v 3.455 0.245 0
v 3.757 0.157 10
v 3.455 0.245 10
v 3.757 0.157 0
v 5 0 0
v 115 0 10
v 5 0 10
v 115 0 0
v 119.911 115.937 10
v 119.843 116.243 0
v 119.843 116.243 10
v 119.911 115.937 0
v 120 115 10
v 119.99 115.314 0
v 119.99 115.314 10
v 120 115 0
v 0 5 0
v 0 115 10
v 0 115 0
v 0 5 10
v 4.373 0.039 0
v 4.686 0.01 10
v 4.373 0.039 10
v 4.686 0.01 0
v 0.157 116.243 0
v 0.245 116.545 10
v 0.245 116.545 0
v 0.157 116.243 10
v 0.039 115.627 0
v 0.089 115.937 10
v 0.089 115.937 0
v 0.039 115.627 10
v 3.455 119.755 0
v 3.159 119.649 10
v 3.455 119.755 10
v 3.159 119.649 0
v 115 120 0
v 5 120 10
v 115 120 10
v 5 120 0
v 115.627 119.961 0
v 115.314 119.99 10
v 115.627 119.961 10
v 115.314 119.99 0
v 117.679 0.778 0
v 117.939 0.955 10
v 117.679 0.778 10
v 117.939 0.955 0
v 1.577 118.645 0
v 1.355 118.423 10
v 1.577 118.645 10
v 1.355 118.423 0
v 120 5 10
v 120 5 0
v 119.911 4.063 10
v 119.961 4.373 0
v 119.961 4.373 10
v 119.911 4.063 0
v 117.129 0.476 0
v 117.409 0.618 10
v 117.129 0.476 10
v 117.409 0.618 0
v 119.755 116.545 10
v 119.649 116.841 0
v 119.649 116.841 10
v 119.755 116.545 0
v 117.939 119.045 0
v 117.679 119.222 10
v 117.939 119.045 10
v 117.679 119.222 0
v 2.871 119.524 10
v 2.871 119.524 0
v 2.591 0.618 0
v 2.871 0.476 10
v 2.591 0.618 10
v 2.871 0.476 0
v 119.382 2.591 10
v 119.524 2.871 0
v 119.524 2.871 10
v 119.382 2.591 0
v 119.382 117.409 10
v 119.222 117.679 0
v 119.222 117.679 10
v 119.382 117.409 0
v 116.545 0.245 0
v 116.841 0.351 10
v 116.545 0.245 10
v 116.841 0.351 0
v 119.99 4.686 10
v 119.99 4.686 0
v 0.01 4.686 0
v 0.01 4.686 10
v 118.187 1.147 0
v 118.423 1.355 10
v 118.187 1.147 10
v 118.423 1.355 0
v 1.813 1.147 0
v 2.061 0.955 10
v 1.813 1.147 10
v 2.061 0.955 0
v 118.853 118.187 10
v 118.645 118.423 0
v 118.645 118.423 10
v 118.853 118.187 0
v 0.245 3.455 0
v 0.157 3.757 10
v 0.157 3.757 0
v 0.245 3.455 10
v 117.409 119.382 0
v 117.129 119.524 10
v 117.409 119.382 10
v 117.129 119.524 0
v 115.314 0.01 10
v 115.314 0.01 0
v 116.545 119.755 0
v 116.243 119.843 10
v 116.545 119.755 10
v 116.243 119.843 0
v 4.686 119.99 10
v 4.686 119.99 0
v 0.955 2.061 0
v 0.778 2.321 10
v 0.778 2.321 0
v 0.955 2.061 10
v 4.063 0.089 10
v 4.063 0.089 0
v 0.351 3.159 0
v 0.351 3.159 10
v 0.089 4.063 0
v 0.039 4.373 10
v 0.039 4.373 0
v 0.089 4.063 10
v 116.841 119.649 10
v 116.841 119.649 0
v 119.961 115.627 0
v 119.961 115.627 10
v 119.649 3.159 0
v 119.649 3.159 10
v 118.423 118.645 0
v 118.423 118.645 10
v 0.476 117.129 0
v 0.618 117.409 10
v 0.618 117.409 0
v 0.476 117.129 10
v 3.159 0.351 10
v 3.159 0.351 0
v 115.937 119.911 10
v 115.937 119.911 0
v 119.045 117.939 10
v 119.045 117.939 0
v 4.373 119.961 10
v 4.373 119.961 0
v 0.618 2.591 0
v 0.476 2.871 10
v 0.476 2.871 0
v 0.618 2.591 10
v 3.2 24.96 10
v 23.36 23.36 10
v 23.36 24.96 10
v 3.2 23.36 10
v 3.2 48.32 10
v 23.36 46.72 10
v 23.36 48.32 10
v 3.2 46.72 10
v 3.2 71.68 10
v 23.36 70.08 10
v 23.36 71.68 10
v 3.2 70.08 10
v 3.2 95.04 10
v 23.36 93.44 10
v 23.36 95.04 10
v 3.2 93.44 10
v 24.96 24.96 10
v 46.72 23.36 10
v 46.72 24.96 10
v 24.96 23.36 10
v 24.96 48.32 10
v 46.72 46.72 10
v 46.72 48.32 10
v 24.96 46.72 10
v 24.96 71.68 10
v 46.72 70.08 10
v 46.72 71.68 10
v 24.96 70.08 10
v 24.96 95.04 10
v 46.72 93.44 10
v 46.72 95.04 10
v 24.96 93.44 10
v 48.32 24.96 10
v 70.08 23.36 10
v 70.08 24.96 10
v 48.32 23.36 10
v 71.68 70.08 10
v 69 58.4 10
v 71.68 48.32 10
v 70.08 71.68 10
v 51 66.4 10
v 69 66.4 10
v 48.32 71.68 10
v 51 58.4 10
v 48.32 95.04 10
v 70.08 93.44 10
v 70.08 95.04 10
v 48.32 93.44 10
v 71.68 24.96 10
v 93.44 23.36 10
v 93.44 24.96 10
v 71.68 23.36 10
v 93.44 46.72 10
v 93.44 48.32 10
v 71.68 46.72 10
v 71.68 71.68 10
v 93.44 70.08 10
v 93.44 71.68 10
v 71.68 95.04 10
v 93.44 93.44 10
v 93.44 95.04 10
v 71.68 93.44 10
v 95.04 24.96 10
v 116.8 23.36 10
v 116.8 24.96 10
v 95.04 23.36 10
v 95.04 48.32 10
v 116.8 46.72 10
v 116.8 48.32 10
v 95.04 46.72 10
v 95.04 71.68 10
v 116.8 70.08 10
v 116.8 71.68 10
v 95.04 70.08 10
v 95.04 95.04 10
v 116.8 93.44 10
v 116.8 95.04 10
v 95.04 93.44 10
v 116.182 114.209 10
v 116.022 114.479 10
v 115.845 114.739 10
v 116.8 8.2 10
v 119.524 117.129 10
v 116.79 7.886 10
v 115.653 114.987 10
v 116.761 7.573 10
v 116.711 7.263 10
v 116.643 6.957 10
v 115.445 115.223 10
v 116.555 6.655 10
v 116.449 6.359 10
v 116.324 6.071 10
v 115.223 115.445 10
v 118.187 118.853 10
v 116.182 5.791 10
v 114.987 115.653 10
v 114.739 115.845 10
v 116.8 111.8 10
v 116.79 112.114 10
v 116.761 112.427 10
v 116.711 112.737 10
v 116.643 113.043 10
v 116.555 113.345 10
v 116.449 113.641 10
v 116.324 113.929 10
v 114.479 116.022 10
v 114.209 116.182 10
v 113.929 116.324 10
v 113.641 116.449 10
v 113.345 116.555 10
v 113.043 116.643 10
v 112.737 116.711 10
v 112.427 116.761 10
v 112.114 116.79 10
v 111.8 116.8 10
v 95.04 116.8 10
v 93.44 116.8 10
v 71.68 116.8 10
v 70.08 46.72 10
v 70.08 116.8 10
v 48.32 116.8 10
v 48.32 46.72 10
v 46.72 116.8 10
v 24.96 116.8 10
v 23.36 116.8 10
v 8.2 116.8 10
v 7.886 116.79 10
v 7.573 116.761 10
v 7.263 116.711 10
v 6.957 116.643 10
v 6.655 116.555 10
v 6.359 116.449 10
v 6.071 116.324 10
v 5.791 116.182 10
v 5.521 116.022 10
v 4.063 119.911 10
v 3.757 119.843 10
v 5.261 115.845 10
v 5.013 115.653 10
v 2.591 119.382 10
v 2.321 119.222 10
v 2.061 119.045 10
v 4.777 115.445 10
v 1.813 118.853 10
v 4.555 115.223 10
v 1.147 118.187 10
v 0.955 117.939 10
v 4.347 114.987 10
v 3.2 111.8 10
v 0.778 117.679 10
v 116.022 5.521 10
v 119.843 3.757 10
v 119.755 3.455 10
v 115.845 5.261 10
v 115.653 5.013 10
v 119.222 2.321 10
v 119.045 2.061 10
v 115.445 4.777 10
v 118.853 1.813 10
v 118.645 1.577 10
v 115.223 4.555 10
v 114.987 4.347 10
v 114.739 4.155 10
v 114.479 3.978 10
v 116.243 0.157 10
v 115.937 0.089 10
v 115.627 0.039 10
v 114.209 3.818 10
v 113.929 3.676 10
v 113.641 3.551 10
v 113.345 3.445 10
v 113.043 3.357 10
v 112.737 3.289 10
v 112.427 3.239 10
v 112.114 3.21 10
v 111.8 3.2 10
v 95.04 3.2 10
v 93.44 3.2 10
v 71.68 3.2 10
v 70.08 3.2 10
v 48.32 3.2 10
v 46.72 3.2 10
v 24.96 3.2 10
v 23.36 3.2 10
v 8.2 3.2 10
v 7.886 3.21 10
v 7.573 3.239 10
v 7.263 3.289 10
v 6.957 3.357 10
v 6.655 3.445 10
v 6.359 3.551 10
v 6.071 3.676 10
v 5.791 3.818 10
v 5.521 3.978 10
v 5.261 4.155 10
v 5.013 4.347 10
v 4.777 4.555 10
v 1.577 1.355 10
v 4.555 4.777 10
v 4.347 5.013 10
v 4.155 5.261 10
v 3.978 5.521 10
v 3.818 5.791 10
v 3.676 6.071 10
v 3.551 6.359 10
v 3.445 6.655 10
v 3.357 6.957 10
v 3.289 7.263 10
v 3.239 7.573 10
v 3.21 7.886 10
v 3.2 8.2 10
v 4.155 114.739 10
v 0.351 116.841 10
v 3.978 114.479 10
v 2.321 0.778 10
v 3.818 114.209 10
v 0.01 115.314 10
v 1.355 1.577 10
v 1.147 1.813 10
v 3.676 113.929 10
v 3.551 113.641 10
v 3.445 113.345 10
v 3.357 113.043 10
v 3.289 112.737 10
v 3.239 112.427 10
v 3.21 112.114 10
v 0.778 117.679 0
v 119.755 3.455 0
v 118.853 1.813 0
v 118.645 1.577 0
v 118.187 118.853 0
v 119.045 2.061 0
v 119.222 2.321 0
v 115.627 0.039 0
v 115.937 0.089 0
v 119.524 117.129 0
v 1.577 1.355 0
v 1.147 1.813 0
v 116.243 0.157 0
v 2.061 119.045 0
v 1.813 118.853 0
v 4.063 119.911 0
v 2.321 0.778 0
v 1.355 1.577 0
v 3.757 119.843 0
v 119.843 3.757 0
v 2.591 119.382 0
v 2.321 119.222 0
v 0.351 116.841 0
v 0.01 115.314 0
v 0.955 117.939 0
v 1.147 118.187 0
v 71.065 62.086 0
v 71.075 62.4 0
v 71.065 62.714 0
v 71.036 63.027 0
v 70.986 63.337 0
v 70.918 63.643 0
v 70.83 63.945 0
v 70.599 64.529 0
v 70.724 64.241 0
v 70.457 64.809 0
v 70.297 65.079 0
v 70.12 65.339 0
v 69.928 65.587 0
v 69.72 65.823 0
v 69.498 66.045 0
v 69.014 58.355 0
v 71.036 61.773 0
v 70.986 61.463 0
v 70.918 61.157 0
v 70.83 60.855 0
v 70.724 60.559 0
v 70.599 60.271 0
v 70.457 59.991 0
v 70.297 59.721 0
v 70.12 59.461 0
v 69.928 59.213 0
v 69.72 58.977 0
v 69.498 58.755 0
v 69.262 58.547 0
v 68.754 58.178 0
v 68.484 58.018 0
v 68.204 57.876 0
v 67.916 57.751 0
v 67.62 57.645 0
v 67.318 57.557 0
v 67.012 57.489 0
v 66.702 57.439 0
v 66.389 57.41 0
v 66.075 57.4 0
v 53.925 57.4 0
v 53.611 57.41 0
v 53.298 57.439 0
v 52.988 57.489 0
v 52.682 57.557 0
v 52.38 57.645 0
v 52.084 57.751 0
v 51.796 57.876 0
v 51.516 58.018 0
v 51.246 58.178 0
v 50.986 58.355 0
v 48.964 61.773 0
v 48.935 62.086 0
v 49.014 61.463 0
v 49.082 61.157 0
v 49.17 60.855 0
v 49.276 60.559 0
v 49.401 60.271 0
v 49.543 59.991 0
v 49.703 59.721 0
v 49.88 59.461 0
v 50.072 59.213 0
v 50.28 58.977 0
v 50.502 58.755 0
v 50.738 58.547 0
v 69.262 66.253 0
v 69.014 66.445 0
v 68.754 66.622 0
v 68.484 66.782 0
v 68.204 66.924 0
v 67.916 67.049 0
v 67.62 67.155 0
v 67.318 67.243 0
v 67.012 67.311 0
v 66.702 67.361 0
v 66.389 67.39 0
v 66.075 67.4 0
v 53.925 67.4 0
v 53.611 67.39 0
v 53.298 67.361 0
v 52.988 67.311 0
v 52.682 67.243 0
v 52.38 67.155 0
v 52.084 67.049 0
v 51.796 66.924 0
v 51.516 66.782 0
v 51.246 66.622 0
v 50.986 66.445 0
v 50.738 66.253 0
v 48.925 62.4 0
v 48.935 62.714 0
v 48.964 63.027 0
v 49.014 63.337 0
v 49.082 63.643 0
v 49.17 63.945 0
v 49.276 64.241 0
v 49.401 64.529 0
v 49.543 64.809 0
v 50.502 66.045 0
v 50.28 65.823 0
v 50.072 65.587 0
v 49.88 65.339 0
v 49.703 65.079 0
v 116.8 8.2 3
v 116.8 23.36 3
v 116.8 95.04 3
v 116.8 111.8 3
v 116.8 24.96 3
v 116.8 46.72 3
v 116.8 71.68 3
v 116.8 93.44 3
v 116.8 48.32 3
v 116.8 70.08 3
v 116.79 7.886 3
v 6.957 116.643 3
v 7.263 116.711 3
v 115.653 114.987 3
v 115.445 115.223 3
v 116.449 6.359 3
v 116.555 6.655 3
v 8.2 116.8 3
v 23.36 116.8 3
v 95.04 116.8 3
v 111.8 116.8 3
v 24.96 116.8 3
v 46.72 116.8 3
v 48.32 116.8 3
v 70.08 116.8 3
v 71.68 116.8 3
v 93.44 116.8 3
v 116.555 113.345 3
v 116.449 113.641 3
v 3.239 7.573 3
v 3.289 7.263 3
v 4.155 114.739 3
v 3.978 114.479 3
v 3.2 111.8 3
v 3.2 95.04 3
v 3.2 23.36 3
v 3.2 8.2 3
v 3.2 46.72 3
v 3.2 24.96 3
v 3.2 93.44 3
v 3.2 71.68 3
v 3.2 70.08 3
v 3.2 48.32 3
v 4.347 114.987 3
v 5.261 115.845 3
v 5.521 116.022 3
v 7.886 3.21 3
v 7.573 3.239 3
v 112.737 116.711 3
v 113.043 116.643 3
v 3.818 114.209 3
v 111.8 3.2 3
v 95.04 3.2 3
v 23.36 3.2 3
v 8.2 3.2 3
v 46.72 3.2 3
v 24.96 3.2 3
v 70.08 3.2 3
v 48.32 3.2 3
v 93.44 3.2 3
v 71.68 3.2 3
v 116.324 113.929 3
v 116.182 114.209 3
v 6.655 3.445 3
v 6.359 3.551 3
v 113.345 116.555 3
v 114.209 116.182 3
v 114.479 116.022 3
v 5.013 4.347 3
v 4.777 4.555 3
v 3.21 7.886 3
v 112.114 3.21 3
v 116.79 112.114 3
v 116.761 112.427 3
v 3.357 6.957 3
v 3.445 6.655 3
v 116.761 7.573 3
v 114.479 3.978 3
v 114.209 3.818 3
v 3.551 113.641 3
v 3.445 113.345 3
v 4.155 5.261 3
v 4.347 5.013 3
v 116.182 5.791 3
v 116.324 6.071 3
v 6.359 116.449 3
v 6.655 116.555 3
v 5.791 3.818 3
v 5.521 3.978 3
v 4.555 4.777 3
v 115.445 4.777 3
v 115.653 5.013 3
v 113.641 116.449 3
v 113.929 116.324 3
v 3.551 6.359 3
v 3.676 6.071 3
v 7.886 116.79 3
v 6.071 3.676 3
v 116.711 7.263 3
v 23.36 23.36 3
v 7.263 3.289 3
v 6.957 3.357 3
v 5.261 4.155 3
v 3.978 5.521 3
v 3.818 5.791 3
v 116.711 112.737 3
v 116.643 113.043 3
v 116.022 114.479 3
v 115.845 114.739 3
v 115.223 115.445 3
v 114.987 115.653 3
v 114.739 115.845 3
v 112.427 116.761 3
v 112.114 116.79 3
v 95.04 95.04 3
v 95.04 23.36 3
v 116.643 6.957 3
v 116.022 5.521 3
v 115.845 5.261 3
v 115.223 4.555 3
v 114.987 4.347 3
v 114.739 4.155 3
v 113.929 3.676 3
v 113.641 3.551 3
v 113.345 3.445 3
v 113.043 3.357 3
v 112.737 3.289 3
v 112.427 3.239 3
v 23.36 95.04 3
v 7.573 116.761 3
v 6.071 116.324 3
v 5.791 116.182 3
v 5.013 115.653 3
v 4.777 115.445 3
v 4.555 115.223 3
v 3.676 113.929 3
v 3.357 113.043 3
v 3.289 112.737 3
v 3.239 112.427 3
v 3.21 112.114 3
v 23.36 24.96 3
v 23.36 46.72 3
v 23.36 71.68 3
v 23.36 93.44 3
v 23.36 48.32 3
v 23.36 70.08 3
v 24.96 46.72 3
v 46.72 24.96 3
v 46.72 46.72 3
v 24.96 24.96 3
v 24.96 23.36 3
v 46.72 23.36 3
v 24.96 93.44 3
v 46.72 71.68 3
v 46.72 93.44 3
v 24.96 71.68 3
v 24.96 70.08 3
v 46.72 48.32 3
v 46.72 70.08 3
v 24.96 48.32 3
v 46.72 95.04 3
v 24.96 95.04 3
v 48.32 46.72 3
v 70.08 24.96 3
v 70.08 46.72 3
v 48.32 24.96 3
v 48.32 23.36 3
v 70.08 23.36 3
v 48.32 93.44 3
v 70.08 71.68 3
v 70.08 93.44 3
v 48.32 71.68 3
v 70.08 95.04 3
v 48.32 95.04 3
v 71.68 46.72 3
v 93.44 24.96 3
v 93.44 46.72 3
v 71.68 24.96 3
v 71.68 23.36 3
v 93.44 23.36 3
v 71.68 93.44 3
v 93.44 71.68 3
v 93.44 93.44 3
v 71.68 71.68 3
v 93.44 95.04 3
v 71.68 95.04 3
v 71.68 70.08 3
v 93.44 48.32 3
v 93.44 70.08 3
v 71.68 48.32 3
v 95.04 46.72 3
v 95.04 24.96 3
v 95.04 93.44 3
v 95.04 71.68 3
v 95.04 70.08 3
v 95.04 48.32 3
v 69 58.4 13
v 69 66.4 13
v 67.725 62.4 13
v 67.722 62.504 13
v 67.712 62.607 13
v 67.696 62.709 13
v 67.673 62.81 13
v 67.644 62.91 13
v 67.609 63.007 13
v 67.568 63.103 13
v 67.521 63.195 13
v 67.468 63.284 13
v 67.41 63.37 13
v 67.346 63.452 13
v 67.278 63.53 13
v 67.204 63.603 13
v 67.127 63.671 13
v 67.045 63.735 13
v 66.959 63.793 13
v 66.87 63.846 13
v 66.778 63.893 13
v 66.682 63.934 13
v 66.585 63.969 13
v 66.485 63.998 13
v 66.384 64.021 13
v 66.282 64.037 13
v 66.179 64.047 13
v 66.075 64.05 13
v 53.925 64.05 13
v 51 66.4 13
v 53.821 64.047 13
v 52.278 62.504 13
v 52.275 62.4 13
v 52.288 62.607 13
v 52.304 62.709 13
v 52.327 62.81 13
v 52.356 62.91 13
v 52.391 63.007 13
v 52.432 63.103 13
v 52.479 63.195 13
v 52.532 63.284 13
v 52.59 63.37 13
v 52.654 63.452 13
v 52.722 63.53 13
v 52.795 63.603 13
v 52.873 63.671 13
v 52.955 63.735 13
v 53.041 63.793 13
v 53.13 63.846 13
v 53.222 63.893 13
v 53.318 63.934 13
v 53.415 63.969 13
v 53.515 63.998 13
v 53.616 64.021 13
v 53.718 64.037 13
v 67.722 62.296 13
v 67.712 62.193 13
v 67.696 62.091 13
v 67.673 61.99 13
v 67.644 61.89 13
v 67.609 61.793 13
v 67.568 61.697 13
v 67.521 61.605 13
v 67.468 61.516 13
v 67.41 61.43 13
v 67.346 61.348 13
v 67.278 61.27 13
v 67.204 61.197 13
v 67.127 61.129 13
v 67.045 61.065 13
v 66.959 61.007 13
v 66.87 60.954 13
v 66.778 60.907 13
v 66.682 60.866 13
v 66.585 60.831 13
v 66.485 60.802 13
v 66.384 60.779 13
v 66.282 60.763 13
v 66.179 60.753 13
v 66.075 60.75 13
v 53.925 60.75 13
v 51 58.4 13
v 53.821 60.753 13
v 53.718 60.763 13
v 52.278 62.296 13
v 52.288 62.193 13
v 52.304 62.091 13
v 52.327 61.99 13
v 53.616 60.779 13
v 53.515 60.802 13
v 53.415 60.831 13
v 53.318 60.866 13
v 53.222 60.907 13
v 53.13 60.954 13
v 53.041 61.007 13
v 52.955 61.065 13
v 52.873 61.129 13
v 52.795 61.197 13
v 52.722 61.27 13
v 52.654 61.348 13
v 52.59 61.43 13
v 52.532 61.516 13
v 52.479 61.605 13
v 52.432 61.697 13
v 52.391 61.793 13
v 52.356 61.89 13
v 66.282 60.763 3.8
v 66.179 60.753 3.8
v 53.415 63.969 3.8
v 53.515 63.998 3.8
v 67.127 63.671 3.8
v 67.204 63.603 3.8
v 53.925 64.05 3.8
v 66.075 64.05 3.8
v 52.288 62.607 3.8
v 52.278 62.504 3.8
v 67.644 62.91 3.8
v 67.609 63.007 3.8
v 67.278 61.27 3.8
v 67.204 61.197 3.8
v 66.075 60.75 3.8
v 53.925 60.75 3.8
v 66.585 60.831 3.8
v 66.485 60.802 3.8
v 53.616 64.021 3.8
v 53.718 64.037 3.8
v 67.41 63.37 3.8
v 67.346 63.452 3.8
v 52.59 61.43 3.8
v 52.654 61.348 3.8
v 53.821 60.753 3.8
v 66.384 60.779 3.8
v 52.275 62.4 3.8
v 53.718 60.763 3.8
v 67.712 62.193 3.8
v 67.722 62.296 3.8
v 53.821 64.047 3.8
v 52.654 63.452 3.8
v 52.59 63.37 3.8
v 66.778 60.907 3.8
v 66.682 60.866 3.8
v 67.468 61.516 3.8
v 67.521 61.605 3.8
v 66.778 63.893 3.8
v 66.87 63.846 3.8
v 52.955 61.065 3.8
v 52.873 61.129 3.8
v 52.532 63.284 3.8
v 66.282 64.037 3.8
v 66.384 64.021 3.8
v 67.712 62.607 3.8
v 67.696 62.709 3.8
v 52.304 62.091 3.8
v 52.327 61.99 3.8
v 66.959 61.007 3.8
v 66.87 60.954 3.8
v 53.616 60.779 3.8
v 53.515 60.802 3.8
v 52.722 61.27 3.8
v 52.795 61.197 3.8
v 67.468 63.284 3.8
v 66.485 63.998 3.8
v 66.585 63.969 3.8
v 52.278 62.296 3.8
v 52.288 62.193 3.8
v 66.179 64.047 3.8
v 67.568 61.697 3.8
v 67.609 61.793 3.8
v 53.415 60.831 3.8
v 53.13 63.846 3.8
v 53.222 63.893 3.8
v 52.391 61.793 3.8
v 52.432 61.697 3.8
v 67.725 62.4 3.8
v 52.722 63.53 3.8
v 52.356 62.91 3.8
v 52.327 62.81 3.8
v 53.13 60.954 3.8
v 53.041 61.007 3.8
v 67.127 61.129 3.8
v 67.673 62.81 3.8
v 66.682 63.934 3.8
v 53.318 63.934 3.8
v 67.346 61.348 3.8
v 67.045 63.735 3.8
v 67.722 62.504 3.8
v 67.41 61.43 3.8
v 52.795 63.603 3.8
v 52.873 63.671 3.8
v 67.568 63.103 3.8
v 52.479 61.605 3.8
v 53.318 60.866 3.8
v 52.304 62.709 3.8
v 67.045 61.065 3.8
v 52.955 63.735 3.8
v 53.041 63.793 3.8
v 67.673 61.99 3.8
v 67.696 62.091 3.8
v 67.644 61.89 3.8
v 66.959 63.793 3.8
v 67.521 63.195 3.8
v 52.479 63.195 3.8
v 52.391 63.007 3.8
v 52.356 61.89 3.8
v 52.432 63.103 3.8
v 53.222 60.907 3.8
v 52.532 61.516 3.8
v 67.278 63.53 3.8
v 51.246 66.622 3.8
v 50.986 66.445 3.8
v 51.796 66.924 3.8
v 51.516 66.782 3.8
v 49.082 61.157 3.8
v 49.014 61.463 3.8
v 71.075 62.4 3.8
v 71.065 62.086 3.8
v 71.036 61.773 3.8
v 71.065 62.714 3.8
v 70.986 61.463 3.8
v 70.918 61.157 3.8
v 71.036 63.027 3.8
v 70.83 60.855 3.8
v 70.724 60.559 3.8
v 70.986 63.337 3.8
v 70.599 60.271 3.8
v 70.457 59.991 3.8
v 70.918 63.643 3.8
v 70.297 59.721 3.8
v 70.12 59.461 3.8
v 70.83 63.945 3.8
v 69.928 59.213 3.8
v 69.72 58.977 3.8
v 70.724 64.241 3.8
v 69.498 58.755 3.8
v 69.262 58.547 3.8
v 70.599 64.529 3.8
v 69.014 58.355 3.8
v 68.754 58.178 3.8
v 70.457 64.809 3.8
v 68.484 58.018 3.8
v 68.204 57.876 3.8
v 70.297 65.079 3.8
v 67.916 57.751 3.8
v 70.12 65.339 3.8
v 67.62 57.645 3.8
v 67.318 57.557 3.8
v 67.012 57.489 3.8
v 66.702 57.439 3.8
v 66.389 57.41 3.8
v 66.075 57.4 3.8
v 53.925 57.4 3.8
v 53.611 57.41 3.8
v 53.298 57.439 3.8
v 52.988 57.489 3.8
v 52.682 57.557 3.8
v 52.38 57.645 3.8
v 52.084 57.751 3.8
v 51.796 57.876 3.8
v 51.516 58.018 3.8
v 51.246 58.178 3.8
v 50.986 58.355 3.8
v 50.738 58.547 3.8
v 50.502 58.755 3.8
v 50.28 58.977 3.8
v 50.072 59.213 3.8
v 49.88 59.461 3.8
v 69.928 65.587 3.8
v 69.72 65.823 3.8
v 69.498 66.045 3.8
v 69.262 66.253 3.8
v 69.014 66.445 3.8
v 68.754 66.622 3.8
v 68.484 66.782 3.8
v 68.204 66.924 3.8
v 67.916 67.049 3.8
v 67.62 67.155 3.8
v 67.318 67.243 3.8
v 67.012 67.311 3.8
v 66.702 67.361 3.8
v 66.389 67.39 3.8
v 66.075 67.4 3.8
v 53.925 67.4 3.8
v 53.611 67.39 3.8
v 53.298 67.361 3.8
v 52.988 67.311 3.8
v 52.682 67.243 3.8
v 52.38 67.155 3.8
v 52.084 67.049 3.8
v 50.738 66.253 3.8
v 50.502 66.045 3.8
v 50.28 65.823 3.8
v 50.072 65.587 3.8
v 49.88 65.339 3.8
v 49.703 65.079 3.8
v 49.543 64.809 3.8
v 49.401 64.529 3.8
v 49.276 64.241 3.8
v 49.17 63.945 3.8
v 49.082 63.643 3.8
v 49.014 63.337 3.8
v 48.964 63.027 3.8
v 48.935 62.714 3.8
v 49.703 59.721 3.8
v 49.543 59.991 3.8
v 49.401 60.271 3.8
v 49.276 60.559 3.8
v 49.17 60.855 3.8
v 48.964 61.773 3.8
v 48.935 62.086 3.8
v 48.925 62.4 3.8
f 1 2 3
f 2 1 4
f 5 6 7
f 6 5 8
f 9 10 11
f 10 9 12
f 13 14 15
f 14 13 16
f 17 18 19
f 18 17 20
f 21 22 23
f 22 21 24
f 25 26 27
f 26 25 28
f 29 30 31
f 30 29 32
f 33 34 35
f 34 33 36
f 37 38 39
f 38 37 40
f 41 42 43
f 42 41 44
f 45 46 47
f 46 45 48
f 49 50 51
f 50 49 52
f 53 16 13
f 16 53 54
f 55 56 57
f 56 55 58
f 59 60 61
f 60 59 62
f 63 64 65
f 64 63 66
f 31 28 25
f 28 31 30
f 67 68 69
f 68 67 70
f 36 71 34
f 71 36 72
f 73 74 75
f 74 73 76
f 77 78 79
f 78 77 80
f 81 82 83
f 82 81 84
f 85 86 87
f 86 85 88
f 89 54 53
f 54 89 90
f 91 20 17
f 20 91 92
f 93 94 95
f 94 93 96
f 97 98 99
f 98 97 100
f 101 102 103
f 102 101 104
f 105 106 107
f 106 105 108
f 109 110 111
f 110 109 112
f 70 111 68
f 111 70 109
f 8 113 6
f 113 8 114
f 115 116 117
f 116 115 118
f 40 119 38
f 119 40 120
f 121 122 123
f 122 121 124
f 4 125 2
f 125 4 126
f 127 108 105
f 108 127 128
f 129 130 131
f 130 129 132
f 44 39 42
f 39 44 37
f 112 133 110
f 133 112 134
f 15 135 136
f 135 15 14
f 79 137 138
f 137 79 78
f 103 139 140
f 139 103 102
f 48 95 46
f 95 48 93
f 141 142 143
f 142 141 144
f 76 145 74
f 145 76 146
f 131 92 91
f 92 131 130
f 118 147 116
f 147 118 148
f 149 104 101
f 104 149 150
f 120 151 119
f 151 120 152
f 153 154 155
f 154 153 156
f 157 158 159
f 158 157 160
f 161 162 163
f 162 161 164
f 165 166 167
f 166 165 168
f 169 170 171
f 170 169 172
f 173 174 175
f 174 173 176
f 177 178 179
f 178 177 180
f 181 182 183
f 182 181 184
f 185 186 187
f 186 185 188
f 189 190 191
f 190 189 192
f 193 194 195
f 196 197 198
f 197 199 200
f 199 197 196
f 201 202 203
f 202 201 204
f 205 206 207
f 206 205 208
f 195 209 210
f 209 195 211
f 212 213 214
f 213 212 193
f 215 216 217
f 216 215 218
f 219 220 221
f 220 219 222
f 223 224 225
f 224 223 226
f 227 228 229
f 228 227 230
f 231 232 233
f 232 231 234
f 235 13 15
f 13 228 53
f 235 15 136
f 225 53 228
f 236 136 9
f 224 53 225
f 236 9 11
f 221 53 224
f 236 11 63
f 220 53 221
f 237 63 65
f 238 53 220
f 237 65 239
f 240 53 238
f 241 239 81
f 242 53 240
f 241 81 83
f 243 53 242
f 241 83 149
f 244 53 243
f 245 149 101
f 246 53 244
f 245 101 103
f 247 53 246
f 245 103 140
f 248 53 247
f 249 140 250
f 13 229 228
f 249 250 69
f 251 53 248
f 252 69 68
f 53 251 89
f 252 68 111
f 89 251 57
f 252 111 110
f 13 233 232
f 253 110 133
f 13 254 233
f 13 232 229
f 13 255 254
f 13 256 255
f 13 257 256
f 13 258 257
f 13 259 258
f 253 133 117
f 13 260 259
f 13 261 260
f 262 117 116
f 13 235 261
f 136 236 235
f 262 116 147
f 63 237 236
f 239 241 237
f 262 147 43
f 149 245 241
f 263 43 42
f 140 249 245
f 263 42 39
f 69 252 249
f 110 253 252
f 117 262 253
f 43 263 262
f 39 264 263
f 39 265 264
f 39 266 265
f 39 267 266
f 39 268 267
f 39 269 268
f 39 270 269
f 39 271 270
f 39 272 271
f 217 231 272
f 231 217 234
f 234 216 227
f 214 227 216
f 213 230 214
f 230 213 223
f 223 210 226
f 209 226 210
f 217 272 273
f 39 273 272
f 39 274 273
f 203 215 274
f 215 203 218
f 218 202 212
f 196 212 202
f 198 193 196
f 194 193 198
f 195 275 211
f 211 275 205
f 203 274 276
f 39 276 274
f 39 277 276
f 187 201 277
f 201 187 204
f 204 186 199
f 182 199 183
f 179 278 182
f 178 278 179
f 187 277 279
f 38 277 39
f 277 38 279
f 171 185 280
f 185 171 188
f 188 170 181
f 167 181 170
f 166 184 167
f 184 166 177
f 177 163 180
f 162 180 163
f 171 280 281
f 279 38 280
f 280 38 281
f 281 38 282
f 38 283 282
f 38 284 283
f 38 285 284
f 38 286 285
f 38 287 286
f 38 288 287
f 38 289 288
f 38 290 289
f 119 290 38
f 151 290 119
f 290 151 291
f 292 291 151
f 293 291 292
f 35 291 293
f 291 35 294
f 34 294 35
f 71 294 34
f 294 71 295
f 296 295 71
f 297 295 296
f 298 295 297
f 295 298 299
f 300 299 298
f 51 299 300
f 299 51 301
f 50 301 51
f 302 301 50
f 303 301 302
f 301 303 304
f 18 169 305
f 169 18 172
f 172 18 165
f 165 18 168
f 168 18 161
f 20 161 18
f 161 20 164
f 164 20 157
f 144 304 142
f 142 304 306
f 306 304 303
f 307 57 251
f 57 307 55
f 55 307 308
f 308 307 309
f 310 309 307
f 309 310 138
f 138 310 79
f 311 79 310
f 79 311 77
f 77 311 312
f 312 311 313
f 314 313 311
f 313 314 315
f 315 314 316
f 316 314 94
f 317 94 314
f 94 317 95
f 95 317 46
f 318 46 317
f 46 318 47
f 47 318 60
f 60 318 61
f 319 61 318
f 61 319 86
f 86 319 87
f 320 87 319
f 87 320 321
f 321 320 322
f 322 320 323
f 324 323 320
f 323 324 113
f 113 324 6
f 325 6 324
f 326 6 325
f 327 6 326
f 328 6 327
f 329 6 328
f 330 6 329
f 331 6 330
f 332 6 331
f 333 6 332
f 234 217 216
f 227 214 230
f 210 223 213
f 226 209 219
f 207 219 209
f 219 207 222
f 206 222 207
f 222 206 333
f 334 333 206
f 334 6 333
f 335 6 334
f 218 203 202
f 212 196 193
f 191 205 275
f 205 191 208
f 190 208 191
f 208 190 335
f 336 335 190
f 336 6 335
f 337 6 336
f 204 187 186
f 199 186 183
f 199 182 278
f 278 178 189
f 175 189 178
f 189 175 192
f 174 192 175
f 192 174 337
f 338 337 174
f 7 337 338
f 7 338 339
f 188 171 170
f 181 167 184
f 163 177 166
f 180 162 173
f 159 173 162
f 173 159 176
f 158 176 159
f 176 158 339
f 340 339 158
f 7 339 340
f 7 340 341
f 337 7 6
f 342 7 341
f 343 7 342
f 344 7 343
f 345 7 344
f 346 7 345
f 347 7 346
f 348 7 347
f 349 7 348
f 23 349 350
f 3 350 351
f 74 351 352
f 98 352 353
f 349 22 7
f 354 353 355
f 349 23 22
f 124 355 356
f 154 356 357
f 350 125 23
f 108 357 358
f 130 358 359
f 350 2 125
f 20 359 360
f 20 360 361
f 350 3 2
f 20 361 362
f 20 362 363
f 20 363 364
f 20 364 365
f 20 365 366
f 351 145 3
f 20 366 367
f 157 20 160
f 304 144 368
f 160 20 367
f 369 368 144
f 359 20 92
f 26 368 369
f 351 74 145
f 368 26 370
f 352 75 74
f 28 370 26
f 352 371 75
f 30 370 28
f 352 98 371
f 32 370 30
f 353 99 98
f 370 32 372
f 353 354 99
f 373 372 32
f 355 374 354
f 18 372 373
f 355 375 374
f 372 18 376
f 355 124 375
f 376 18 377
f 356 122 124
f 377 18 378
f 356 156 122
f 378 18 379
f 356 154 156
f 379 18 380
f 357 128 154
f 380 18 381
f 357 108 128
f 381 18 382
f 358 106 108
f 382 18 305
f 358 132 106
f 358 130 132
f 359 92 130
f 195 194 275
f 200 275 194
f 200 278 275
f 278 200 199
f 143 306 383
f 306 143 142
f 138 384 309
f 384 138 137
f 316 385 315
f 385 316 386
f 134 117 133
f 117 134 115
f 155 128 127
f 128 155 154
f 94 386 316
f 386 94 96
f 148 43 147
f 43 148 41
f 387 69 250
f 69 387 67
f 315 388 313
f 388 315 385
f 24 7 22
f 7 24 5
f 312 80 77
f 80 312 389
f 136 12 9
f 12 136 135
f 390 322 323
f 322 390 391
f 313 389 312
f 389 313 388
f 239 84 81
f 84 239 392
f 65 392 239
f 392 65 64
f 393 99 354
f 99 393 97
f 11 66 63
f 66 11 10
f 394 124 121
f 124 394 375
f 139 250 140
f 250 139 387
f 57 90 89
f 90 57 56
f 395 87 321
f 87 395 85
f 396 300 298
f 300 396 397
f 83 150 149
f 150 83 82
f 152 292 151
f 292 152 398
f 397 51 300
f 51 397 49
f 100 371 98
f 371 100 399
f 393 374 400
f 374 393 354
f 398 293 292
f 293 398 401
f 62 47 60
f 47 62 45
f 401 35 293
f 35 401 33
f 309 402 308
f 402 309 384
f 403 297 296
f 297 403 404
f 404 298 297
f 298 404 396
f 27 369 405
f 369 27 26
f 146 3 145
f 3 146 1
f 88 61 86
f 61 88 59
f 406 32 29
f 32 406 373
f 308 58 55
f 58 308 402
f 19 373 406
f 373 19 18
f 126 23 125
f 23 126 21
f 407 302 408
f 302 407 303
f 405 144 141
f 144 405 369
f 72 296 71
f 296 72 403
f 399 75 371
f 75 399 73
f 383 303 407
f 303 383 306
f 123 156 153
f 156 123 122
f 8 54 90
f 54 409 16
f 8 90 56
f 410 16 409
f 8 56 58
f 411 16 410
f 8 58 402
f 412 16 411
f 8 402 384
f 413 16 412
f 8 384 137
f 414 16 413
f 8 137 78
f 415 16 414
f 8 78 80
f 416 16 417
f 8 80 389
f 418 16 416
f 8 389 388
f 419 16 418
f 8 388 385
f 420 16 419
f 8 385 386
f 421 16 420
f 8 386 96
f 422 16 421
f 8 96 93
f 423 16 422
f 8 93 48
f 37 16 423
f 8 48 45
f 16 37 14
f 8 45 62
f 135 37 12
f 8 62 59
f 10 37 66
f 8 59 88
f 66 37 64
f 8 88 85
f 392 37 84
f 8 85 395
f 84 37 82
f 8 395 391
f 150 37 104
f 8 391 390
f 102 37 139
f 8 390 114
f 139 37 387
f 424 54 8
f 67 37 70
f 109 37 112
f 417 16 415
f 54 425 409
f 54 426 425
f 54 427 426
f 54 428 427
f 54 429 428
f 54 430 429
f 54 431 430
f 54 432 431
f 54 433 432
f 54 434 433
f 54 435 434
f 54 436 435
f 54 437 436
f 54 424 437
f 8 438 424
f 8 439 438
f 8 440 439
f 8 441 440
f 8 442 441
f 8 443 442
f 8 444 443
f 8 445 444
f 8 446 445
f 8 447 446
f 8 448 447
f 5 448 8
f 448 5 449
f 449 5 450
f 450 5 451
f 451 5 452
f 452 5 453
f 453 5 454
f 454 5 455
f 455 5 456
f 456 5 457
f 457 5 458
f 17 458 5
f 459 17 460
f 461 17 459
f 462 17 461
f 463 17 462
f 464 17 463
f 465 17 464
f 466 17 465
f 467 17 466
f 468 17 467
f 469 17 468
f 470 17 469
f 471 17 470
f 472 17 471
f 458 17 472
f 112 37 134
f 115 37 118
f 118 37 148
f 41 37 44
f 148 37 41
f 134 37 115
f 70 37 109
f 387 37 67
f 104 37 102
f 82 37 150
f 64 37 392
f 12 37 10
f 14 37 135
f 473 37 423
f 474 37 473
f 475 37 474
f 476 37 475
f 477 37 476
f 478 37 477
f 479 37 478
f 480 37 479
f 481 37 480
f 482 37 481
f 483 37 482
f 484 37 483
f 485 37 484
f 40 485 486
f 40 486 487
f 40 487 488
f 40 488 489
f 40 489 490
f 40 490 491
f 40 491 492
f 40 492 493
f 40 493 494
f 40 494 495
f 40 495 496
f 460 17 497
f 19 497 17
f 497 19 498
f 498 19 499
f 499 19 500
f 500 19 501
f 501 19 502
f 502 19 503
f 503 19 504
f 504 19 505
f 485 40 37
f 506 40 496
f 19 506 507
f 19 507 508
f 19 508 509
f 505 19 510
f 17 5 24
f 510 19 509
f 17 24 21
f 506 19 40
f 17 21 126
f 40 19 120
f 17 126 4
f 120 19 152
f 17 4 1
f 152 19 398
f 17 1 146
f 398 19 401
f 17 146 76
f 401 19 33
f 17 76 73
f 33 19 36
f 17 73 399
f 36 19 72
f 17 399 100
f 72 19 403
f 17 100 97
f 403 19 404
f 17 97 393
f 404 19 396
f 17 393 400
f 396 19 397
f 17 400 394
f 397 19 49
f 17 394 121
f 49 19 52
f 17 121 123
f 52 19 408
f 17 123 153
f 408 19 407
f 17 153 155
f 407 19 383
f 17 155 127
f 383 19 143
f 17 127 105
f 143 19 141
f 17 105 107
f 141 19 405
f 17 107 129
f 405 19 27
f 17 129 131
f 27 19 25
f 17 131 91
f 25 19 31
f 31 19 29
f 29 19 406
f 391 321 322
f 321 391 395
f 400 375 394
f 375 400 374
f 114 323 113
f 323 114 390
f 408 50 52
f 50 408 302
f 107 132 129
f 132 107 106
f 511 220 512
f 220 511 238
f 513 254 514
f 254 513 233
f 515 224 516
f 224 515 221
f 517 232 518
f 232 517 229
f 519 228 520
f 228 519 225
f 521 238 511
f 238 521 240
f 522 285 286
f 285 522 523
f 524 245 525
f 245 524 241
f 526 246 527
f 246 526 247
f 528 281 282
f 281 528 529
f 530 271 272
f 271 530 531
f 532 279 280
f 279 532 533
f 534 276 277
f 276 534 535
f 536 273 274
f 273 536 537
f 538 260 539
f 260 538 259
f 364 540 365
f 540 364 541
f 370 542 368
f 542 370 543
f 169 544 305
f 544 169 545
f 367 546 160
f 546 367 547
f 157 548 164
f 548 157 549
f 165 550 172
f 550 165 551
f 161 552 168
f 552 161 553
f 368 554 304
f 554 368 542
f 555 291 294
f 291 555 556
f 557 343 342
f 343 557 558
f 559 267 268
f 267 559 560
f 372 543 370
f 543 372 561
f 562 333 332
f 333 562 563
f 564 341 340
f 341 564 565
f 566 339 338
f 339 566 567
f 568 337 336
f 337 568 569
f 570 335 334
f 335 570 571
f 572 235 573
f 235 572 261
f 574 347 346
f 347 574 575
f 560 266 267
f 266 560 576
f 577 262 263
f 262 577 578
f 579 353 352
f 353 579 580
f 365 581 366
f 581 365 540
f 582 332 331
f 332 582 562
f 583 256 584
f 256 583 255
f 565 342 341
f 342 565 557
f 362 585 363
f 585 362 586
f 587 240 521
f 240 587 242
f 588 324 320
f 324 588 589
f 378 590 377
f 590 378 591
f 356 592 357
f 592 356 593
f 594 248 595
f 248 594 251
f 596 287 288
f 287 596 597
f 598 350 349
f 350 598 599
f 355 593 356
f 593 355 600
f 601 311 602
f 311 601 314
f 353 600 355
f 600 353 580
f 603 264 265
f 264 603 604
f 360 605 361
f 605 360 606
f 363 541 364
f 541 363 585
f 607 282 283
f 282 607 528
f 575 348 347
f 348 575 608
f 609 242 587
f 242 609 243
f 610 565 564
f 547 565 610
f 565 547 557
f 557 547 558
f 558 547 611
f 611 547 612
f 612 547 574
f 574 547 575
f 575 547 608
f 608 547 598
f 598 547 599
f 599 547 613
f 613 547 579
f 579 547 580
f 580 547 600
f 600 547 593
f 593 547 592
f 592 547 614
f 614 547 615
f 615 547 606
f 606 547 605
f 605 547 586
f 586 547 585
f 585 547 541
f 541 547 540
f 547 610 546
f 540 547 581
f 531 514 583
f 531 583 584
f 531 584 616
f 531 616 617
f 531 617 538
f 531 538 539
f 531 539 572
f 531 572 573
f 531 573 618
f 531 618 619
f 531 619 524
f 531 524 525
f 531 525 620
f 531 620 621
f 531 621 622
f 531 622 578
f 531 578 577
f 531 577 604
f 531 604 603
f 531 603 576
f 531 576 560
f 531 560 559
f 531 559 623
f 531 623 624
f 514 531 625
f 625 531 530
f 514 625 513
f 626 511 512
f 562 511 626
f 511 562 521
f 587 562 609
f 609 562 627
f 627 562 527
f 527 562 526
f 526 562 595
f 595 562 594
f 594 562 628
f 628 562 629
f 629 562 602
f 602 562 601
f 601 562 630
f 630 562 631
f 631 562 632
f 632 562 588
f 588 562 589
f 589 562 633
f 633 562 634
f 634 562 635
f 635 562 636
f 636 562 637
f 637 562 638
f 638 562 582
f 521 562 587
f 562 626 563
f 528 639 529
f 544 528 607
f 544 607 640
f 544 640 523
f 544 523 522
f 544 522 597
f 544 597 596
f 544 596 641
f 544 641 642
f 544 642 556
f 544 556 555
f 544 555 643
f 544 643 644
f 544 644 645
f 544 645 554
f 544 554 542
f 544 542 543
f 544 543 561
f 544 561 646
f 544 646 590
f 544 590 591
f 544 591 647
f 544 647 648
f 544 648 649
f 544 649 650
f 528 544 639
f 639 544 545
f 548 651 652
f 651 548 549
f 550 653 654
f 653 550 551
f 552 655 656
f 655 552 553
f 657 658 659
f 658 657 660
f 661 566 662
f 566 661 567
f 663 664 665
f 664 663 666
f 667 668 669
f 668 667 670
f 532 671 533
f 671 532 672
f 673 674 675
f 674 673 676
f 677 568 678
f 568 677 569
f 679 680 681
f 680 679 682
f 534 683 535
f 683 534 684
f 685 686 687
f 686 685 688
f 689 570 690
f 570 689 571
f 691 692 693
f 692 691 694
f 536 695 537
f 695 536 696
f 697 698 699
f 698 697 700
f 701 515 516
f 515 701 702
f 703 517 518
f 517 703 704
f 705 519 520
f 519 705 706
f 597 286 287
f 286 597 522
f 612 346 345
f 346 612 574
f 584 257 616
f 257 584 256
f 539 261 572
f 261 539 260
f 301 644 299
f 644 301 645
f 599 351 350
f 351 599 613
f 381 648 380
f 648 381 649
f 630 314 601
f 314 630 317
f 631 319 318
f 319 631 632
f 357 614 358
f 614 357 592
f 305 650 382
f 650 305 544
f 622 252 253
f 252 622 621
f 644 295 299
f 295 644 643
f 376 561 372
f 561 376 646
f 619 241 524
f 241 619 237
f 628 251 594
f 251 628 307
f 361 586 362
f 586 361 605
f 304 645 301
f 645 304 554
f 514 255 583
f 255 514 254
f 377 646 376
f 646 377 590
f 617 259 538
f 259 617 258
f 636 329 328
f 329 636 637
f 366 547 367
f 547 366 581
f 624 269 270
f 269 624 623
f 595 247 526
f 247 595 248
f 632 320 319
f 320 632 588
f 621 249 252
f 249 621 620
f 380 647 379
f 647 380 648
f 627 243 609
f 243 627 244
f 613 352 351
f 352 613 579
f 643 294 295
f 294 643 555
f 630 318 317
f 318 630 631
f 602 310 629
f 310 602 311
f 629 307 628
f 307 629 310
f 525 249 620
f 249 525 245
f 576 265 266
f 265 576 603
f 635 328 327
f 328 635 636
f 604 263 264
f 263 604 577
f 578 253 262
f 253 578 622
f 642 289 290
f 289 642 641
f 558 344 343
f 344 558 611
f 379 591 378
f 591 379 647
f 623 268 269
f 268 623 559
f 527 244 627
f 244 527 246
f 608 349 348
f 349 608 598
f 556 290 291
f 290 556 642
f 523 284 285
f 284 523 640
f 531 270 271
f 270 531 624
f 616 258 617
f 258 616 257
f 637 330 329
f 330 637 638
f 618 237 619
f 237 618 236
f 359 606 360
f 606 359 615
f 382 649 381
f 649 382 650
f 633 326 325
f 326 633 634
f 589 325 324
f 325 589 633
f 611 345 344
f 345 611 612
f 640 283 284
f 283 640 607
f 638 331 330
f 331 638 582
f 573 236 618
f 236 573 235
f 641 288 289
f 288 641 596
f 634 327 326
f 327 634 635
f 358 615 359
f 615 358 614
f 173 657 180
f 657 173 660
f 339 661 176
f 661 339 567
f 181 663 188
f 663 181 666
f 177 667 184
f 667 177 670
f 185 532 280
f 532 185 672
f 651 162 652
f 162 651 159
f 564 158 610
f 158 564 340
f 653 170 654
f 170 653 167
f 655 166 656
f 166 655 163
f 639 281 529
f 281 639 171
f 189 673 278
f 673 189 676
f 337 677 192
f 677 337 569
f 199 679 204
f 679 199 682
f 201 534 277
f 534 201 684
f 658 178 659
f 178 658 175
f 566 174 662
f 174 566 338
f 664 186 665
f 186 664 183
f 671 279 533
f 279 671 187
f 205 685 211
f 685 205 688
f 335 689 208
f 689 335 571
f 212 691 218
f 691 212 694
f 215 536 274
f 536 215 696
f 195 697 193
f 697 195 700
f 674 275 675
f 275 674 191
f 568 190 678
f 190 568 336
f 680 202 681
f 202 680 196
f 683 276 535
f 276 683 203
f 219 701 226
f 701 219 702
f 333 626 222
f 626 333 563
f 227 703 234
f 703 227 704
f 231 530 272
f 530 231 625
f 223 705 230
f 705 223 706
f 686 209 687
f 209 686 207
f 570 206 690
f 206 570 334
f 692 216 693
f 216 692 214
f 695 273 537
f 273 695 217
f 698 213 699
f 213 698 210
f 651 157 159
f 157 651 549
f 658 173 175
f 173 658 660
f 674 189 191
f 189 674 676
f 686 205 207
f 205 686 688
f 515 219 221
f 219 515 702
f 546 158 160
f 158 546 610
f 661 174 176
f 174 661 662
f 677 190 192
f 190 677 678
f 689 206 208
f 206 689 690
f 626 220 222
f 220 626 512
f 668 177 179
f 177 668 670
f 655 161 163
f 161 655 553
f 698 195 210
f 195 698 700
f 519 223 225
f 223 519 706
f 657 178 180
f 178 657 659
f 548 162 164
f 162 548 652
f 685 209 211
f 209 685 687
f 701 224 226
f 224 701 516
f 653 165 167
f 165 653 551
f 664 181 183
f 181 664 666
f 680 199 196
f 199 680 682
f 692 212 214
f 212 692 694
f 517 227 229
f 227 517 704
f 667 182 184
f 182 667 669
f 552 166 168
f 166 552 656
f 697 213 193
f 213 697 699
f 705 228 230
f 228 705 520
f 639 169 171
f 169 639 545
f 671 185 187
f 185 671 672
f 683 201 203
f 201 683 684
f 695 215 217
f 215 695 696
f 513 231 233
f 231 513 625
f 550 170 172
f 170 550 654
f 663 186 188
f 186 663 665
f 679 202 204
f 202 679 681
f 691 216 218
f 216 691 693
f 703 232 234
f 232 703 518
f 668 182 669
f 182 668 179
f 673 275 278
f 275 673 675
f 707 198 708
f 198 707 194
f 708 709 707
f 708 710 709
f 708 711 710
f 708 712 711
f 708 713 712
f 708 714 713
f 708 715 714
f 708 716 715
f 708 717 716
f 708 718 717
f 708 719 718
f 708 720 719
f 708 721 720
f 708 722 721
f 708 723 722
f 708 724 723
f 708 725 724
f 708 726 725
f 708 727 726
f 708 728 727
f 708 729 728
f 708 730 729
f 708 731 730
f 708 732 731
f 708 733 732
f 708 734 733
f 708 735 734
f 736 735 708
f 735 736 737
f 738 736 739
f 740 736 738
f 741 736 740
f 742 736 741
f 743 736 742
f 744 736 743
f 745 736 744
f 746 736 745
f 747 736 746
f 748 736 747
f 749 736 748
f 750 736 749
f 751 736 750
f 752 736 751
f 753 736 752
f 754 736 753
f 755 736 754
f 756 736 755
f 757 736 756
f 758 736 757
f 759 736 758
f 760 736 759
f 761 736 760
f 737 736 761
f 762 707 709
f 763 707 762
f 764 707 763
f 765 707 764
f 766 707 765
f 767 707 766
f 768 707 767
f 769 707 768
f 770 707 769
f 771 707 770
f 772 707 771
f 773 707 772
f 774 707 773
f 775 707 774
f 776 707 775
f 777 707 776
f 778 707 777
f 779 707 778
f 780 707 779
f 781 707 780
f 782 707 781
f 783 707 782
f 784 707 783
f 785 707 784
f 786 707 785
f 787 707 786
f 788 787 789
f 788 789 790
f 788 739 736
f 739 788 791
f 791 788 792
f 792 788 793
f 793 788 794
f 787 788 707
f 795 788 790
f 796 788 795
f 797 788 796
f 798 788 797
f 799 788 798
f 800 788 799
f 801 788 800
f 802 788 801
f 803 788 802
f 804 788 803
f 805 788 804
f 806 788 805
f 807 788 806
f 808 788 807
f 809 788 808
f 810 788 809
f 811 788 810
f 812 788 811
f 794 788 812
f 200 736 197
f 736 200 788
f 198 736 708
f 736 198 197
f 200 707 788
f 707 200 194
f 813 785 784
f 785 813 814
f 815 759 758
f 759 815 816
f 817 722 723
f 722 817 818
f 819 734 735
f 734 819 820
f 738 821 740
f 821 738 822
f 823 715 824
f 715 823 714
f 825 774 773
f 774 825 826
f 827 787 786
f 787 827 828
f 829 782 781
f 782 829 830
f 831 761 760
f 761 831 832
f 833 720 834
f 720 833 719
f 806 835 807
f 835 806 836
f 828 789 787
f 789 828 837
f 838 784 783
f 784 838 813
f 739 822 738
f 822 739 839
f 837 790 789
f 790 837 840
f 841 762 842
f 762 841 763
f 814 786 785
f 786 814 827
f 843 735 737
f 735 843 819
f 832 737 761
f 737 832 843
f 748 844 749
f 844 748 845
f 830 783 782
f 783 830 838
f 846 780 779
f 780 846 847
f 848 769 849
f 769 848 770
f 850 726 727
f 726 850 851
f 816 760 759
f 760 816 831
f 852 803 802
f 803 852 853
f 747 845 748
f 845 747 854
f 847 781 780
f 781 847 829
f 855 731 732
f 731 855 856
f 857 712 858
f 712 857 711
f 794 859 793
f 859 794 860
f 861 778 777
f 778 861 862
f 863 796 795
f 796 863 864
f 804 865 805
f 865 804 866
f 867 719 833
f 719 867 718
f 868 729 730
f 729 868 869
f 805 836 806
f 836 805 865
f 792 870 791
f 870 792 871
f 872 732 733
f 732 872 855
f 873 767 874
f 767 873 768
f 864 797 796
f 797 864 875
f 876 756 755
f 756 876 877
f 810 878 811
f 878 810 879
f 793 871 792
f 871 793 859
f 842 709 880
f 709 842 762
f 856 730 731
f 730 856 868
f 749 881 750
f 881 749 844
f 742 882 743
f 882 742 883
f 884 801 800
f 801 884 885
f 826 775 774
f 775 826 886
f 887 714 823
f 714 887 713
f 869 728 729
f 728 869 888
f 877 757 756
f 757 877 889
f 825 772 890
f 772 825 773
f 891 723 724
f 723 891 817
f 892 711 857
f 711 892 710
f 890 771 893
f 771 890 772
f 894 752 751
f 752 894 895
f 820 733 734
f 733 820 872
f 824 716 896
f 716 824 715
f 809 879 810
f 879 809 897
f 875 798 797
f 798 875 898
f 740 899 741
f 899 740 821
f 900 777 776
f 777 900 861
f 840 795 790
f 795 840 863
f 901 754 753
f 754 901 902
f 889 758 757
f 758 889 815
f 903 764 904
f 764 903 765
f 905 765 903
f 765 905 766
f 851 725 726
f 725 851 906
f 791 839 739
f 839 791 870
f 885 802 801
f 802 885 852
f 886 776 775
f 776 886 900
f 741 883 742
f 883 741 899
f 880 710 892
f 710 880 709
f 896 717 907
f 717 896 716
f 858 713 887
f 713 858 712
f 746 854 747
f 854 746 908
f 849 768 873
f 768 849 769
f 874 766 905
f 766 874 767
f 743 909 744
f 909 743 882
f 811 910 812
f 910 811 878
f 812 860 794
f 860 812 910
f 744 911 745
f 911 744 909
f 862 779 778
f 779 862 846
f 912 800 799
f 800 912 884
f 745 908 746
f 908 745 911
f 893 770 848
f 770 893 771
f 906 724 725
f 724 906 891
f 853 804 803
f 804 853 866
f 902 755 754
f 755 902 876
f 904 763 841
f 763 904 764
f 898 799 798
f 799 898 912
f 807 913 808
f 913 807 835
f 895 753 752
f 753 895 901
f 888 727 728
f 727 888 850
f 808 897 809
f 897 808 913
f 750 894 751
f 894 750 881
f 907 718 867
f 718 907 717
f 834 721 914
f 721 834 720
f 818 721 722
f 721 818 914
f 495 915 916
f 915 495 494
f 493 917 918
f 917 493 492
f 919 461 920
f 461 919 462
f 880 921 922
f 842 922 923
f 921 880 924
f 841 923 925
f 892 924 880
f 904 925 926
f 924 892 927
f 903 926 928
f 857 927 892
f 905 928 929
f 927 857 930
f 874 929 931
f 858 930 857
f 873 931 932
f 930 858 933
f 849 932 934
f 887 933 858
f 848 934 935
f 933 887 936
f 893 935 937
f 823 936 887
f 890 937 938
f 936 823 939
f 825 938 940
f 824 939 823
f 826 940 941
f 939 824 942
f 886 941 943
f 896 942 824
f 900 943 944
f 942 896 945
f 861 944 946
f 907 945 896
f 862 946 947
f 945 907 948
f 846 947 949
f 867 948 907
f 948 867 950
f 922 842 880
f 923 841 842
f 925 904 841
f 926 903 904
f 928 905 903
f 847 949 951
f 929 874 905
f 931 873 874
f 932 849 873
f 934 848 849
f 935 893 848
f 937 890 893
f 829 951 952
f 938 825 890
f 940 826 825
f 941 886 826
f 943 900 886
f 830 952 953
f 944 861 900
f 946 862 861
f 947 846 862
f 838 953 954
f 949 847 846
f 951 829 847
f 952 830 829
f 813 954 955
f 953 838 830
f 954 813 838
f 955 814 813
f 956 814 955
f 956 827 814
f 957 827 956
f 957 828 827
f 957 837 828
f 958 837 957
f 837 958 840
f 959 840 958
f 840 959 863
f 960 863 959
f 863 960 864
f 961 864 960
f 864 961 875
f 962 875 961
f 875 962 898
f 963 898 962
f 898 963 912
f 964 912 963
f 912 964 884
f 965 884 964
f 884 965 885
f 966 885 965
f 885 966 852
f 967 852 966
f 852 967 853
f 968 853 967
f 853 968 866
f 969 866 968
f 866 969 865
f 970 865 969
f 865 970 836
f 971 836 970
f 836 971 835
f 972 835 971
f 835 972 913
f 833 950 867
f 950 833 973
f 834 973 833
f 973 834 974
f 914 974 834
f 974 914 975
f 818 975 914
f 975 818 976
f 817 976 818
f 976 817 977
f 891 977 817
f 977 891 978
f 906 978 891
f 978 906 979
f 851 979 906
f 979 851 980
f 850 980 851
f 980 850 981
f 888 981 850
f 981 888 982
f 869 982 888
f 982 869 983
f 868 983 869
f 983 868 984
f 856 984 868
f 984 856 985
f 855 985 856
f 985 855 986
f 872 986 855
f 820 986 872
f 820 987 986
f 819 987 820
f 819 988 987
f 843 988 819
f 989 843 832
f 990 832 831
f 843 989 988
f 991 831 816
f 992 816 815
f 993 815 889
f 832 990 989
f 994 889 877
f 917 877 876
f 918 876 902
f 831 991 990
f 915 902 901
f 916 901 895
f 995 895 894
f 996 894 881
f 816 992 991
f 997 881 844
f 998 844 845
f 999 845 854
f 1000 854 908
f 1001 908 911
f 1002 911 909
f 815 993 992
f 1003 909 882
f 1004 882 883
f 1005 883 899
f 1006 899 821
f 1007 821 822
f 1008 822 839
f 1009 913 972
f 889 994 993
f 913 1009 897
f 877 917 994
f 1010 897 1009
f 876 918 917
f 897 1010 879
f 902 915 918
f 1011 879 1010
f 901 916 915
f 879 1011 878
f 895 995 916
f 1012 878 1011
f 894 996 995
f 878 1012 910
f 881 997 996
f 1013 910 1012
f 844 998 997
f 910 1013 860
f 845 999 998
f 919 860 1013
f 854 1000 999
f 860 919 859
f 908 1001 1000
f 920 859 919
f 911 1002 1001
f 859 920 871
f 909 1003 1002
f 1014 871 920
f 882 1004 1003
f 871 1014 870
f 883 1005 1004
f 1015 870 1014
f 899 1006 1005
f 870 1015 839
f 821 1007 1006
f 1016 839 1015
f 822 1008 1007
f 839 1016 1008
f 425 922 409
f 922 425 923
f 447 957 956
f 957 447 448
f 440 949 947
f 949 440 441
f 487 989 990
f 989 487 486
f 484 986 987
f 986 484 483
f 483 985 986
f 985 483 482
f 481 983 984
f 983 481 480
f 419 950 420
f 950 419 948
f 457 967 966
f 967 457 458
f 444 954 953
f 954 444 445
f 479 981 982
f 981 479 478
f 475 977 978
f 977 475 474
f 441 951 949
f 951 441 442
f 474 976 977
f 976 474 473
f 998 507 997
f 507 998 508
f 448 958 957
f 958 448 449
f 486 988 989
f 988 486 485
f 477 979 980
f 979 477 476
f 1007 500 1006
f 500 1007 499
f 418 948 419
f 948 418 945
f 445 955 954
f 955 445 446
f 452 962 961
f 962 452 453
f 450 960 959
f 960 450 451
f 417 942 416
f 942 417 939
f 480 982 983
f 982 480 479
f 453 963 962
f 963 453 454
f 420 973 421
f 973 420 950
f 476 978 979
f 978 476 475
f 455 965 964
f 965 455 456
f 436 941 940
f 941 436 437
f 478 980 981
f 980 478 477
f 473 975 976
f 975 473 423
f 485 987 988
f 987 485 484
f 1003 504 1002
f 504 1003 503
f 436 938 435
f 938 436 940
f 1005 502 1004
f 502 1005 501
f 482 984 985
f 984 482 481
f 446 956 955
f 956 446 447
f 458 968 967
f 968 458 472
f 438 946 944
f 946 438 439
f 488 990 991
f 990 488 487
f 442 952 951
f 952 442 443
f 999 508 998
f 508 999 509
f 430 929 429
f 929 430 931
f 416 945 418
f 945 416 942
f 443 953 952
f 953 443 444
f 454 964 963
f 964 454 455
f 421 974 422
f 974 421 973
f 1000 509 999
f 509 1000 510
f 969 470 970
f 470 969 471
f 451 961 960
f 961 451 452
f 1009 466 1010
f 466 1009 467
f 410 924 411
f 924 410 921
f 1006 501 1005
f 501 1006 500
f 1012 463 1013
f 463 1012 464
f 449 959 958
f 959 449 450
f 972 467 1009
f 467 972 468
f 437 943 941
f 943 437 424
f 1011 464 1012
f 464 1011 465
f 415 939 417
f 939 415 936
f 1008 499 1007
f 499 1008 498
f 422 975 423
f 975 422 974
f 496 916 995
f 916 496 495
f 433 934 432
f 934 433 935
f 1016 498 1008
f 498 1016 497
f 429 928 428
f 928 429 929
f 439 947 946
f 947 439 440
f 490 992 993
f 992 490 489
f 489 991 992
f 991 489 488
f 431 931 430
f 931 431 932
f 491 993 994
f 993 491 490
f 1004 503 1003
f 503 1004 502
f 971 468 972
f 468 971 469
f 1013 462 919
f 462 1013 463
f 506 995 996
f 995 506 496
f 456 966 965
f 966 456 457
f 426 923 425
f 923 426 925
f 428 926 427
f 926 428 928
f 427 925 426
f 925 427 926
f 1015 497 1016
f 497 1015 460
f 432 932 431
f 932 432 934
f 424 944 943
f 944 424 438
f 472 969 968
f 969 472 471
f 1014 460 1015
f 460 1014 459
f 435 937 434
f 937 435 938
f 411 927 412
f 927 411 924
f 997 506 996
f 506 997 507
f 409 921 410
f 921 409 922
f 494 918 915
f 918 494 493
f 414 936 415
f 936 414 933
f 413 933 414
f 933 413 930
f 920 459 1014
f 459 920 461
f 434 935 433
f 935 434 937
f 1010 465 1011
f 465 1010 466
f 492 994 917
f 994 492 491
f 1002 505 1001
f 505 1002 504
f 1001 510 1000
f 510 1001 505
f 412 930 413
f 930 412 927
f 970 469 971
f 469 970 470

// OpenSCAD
$fn = $preview ? 100 : 100; // Разрешение модели

module move(x=0,y=0,z=0,rx=0,ry=0,rz=0) // Модуль перемещения
{translate([x,y,z]) rotate([rx,ry,rz]) children();}




difference(){
  union() {
  poddon();
  *move(z=H, rx=180) krishka();
  *move(z=2*H-9.5-4, rx=180) zazim();
  }
  *move(x=-60-2) cube(120);
}

%move(x=dL*2+dL/2+think/2-dat_L/2, y=7*think-3.5, z=h+3) color("blue",0.5) cube([dat_L, dat_L0, dat_H]);



length=120;
h=10;
  H=17; // Высота крышки
think=3.2;
n=5;
L=(length-think)/n;
Len2=length-2*L;
n2=3;
dL=(Len2-think)/n2;

dat_L=12; // Длина площадки крепления датчика
dat_W=8; // Ширина площадки крепления датчика
dat_H=6.15; // Толщина датчика
dat_C1=6.15; //растояние между центрами отверстий крепления датчика по ширине
dat_C2=40.3;// растояние между центрами отверстий крепления датчика по длине
dat_L0=47; // Длина датчика


// Размеры платы hx11
HX11_W=16;
HX11_L=24;
HX11_H=3;

module poddon() {
difference() { 
  union() { 
    difference() {
    hull() {
      r=5;
    move(x=r, y=r) cylinder(h=h, r=r);
    move(x=length-r, y=r) cylinder(h=h, r=r);
    move(x=r, y=length-r) cylinder(h=h, r=r);
    move(x=length-r, y=length-r) cylinder(h=h, r=r);
    }
    move(z=3) hull() {
      r=5;
      h=h;
    move(x=r+think, y=r+think) cylinder(h=h, r=r);
    move(x=length-r-think, y=r+think) cylinder(h=h, r=r);
    move(x=r+think, y=length-r-think) cylinder(h=h, r=r);
    move(x=length-r-think, y=length-r-think) cylinder(h=h, r=r);
    }
    }


    move(x=dL) for (i=[0:n2]) {
    move(x=dL*i) cube([think/2, length,h]);
    }
    move(y=dL) for (i=[0:n2]) {
    move(y=dL*i) cube([length, think/2, h]);
    }
    move(x=2*dL, y=2*dL) cube([dL, dL, h]);

    move(x=2*dL+think+(dL-think)/2, y=think*7+dat_L0-3.5*2, z=h+3/2) cube([dat_L+3+3, dat_W, 3], center=true);
}
move(x=2*dL+think+(dL-think)/2, y=think*7+dat_L0-3.5*2) union() {
  hull(){
move(x=-dat_C1/2-3) cylinder(h = 20, d = 3.3);
move(x=dat_C1/2+3) cylinder(h = 20, d = 3.3);
  }
  hull (){
move(x=-dat_C1/2-3, z=-20+2.8+1) cylinder(h = 20, d = 10);
move(x=dat_C1/2+3, z=-20+2.8+1) cylinder(h = 20, d = 10);
  }
}
}
}




module krishka() {

  difference() {
  union() {
difference(){
  hull() {
  r=5;
  move(x=r, y=r) cylinder(h=H, r=r);
  move(x=length-r, y=r) cylinder(h=H, r=r);
  move(x=r, y=length-r) cylinder(h=H, r=r);
  move(x=length-r, y=length-r) cylinder(h=H, r=r);
}
move(z=-0.1) hull() {
  r=5;
  h=H-think+0.1;
  move(x=r+think, y=r+think) cylinder(h=h, r=r);
  move(x=length-r-think, y=r+think) cylinder(h=h, r=r);
  move(x=r+think, y=length-r-think) cylinder(h=h, r=r);
  move(x=length-r-think, y=length-r-think) cylinder(h=h, r=r);
}
}    
move(x=2*dL+think+(dL-think)/2, y=think*7, z=1.5+1+dat_H) cube([dat_L, dat_W, 3], center=true);
move(x=2*dL+think+(dL-think)/2, y=think*7, z=1.5+1+dat_H+4) cube([dat_L, dat_W*2, 5], center=true);

difference() {
move(y=15, z=H-9.5) hull() {
move(x=9) cylinder(h = 9.5, r = 4);
move(x=21) cylinder(h = 9.5, r = 4);
}
move(x=15, y=20,z=H-9.5-3+3/2, rx=90) cylinder(h = 10, r = 3);
move(y=15, z=H-9.5) union() {
move(x=9) cylinder(h = 9.5, r = 1);
move(x=21) cylinder(h = 9.5, r = 1);
}
}
  }

move(x=2*dL+think+(dL-think)/2, y=think*7) union() {
move(x=-dat_C1/2) cylinder(h = 20, d = 3.3);
move(x=dat_C1/2) cylinder(h = 20, d = 3.3);
move(x=-dat_C1/2, z=H-2.8) cylinder(h = 20, d = 6);
move(x=dat_C1/2, z=H-2.8) cylinder(h = 20, d = 6);
}
move(x=15, y=5,z=H-9.5, rx=90) cylinder(h = 10, d = 3.5);
  }
move(x=think,y=30,z=H-think-HX11_H) difference() {
  delta=2;
cube([HX11_W+delta*2, HX11_L+delta*2, HX11_H]);
move(x=delta,y=delta) cube([HX11_W, HX11_L, HX11_H]);
}
}


module zazim() {
  difference() {
  move(y=15) hull() {
move(x=9) cylinder(h = 4, r = 4);
move(x=21) cylinder(h = 4, r = 4);
}
move(y=15) union() {
move(x=9) cylinder(h = 4, r2 = 1, r1 = 2.8);
move(x=21) cylinder(h = 4, r2 = 1, r1 = 2.8);
move(x=15, y=5,z=6+1-3+3/2, rx=90) cylinder(h = 10, r = 3);
}

  }
}
